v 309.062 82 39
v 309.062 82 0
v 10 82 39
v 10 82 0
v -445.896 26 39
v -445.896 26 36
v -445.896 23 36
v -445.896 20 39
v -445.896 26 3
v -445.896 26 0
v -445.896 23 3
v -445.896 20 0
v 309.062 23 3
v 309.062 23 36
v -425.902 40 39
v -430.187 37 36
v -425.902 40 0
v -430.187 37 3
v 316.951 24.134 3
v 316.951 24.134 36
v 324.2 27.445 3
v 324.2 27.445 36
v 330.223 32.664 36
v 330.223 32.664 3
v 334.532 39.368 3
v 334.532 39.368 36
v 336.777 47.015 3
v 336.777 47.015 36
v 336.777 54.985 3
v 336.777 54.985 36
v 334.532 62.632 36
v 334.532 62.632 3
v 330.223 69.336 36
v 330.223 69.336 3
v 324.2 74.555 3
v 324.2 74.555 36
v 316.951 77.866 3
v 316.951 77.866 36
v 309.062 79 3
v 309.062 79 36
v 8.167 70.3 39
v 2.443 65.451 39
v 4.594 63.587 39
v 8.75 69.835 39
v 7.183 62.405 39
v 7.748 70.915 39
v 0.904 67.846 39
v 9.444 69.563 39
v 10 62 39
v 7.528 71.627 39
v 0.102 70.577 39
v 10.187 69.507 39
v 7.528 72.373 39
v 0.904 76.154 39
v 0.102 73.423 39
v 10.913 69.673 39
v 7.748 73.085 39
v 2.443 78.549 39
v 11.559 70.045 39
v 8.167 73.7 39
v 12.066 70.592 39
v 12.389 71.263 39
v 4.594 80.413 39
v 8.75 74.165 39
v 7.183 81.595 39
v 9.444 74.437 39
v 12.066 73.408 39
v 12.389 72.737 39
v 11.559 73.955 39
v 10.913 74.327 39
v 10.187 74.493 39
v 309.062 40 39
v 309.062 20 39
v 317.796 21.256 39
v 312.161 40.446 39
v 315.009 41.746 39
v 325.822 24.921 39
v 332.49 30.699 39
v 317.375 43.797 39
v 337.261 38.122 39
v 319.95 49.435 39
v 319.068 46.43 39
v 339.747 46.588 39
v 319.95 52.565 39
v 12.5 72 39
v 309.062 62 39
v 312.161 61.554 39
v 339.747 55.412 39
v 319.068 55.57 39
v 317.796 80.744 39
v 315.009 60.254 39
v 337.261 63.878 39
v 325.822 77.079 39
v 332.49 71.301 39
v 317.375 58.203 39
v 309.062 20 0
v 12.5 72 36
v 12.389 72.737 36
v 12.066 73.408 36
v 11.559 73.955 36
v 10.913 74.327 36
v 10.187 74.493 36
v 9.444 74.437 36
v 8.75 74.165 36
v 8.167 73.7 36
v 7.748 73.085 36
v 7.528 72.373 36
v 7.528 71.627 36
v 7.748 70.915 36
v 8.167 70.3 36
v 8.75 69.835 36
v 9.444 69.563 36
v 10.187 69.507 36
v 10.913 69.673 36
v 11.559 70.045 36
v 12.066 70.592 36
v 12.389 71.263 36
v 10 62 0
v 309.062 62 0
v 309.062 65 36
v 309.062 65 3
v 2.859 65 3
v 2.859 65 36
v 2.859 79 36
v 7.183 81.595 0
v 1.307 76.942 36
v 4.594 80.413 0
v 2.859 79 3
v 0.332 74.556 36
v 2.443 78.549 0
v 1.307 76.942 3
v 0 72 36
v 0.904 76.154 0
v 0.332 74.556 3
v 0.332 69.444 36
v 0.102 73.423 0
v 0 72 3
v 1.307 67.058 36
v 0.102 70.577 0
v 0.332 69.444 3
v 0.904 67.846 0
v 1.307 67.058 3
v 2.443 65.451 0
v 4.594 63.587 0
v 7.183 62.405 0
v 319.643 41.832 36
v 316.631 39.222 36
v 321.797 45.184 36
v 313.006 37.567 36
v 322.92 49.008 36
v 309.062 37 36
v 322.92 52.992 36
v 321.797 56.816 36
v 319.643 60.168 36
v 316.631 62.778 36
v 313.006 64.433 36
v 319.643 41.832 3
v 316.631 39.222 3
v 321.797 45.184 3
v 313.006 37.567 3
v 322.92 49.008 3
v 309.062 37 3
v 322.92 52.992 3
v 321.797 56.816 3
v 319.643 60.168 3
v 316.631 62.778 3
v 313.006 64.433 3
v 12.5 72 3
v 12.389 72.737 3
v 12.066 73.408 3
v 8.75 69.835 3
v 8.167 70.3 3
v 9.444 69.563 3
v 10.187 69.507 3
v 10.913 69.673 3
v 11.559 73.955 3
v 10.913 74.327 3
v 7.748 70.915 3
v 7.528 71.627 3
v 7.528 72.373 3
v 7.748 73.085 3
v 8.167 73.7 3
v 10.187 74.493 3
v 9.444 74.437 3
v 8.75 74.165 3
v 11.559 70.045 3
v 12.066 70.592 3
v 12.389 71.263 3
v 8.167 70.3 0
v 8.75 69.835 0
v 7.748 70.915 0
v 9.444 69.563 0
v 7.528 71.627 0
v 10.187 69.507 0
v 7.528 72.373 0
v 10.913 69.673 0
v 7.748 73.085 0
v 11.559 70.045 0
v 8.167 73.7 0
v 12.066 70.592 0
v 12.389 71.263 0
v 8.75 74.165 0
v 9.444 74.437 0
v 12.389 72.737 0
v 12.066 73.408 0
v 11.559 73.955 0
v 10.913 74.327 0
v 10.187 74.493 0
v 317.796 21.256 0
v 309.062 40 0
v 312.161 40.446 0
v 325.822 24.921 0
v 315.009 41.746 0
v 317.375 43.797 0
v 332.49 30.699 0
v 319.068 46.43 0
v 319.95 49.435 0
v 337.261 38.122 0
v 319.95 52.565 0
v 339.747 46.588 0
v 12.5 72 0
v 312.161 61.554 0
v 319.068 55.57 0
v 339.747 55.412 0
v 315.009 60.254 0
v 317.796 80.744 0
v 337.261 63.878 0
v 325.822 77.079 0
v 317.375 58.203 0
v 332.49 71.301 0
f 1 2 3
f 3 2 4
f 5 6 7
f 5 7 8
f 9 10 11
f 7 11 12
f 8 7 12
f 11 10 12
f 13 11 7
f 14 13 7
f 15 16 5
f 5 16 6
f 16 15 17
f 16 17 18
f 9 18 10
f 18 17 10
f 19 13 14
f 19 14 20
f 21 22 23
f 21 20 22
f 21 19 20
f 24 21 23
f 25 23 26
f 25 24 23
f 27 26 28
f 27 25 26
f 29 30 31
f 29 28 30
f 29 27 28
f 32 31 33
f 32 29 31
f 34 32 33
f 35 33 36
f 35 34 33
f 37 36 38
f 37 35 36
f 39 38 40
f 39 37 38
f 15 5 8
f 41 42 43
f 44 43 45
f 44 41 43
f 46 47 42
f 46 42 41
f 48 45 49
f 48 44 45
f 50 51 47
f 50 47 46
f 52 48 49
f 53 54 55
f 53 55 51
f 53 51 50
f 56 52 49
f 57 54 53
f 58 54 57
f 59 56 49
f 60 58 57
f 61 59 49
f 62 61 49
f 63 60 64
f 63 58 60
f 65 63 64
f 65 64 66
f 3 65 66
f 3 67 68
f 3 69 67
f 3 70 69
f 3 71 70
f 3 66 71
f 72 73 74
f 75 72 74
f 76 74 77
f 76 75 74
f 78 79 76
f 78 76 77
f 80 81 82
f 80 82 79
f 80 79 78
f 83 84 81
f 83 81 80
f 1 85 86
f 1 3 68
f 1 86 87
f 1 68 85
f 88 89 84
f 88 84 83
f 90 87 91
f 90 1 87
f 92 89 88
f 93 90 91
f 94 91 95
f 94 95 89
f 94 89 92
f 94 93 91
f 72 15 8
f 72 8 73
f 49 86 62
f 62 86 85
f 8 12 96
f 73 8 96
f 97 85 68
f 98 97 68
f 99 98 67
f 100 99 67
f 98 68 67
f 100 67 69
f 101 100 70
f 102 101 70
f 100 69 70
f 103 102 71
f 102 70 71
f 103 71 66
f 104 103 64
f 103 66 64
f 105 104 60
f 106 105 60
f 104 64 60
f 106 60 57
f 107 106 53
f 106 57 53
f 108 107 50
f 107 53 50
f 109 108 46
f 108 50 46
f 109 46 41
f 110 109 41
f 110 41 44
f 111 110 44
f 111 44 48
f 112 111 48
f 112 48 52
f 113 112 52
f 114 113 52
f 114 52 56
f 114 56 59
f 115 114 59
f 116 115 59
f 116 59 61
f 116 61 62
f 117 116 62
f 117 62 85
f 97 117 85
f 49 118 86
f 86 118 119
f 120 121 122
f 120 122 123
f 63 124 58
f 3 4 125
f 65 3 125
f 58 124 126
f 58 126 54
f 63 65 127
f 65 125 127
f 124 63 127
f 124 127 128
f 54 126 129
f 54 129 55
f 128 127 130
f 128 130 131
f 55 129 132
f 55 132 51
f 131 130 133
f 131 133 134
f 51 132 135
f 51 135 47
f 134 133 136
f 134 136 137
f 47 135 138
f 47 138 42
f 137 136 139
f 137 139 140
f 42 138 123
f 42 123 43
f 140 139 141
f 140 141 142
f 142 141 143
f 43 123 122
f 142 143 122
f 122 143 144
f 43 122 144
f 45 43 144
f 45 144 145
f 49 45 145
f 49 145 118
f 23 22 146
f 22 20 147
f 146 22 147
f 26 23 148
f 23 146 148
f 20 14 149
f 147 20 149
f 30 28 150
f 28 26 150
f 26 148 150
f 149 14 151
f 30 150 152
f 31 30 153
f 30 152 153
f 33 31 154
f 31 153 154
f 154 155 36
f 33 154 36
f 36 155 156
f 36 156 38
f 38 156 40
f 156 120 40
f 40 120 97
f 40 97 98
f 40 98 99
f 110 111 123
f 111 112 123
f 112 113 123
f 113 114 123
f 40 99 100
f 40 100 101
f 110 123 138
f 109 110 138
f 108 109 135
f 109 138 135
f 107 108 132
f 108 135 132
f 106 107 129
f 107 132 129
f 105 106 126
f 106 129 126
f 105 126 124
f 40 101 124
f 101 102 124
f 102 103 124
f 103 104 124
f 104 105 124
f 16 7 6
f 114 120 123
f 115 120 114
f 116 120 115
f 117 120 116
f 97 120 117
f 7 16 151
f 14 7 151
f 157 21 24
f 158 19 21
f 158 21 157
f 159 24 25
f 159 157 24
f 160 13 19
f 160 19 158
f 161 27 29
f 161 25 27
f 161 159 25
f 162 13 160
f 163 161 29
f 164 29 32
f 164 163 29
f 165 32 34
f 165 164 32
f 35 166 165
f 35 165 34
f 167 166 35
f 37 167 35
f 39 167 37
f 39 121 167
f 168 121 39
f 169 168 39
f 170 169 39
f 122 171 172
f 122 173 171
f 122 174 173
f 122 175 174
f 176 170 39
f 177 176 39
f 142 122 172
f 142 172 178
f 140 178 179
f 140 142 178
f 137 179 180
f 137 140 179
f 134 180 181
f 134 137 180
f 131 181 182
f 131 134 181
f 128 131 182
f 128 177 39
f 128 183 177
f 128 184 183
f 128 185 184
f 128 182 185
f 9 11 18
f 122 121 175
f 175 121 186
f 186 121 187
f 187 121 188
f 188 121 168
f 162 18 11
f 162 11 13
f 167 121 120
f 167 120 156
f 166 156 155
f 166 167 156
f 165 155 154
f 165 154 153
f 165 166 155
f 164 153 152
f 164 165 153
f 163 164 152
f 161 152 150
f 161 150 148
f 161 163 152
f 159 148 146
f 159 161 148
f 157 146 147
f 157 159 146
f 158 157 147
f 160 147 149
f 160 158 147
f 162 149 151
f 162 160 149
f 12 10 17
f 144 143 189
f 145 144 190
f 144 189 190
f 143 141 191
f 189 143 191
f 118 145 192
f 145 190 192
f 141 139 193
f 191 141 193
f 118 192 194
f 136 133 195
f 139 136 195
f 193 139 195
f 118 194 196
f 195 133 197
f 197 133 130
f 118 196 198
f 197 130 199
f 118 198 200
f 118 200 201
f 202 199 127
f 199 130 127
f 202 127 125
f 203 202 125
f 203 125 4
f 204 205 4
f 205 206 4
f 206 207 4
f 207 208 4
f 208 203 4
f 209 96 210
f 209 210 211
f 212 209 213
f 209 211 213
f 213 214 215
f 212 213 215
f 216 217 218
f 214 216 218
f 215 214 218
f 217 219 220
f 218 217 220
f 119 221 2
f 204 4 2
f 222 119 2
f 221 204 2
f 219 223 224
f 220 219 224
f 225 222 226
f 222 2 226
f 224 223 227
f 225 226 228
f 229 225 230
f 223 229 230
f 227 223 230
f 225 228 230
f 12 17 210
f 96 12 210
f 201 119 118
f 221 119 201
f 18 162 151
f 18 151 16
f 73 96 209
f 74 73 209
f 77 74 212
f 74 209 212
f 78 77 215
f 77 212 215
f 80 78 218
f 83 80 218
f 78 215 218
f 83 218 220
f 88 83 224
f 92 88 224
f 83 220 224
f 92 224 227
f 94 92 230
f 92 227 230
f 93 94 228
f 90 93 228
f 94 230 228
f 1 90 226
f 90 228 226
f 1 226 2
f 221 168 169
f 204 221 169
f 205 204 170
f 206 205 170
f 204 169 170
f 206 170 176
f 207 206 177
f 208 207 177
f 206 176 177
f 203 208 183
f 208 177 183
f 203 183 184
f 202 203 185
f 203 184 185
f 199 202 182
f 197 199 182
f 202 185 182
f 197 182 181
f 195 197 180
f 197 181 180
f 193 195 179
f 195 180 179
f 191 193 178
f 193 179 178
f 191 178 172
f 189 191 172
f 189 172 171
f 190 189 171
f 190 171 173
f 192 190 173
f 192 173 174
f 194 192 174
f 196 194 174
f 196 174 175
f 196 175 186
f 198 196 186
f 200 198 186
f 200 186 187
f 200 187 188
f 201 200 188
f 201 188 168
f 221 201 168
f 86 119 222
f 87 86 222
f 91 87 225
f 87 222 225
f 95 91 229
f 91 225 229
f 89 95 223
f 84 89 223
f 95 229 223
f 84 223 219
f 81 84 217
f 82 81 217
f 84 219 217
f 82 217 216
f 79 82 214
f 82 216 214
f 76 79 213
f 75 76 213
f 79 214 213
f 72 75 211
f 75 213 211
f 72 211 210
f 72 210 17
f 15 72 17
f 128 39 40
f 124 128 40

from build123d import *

# Parameters (mm, degrees)
BOSS_EXTRUDE1_DEPTH = 39
SHELL1_T            = -3
SKETCH2_W           = 33
SKETCH2_H           = 14
CUT_EXTRUDE1_DEPTH  = 455.896372
SKETCH3_R           = 2.5
CUT_EXTRUDE2_DEPTH  = 456.047881521


with BuildPart() as part:
    # Sketch1 → Boss-Extrude1 (new body)
    with BuildSketch(Plane.XY):
        with BuildLine():
            Line((309.062127233, 40), (-425.902299809, 40))
            Line((-425.902299809, 40), (-445.896371903, 26))
            Line((-445.896371903, 26), (-445.896371903, 20))
            Line((-445.896371903, 20), (309.062127233, 20))
            ThreePointArc((309.062127233, 20), (340.062127233, 51), (309.062127233, 82))
            Line((309.062127233, 82), (10, 82))
            ThreePointArc((10, 82), (0, 72), (10, 62))
            Line((10, 62), (309.062127233, 62))
            ThreePointArc((309.062127233, 62), (320.062127233, 51), (309.062127233, 40))
        make_face()
    extrude(amount=BOSS_EXTRUDE1_DEPTH)

    # Shell1
    shell1_openings = [part.faces().sort_by_distance(p)[0] for p in [
        (-435.899335856, 33, 19.5),
    ]]
    offset(amount=SHELL1_T, openings=shell1_openings, kind=Kind.INTERSECTION)

    # Sketch2 → Cut-Extrude1 (cut)
    with BuildSketch(Plane.ZY.offset(445.896371903)):
        with Locations((19.5, 72)):
            Rectangle(SKETCH2_W, SKETCH2_H)
        with Locations((19.5, 30)):
            Rectangle(SKETCH2_W, SKETCH2_H)
    extrude(amount=-CUT_EXTRUDE1_DEPTH, mode=Mode.SUBTRACT)

    # Sketch3 → Cut-Extrude2 (cut, through all)
    with BuildSketch(Plane.XY.offset(39)):
        with Locations((10, 72)):
            Circle(SKETCH3_R)
    extrude(amount=-CUT_EXTRUDE2_DEPTH, mode=Mode.SUBTRACT)


solid = part.part
